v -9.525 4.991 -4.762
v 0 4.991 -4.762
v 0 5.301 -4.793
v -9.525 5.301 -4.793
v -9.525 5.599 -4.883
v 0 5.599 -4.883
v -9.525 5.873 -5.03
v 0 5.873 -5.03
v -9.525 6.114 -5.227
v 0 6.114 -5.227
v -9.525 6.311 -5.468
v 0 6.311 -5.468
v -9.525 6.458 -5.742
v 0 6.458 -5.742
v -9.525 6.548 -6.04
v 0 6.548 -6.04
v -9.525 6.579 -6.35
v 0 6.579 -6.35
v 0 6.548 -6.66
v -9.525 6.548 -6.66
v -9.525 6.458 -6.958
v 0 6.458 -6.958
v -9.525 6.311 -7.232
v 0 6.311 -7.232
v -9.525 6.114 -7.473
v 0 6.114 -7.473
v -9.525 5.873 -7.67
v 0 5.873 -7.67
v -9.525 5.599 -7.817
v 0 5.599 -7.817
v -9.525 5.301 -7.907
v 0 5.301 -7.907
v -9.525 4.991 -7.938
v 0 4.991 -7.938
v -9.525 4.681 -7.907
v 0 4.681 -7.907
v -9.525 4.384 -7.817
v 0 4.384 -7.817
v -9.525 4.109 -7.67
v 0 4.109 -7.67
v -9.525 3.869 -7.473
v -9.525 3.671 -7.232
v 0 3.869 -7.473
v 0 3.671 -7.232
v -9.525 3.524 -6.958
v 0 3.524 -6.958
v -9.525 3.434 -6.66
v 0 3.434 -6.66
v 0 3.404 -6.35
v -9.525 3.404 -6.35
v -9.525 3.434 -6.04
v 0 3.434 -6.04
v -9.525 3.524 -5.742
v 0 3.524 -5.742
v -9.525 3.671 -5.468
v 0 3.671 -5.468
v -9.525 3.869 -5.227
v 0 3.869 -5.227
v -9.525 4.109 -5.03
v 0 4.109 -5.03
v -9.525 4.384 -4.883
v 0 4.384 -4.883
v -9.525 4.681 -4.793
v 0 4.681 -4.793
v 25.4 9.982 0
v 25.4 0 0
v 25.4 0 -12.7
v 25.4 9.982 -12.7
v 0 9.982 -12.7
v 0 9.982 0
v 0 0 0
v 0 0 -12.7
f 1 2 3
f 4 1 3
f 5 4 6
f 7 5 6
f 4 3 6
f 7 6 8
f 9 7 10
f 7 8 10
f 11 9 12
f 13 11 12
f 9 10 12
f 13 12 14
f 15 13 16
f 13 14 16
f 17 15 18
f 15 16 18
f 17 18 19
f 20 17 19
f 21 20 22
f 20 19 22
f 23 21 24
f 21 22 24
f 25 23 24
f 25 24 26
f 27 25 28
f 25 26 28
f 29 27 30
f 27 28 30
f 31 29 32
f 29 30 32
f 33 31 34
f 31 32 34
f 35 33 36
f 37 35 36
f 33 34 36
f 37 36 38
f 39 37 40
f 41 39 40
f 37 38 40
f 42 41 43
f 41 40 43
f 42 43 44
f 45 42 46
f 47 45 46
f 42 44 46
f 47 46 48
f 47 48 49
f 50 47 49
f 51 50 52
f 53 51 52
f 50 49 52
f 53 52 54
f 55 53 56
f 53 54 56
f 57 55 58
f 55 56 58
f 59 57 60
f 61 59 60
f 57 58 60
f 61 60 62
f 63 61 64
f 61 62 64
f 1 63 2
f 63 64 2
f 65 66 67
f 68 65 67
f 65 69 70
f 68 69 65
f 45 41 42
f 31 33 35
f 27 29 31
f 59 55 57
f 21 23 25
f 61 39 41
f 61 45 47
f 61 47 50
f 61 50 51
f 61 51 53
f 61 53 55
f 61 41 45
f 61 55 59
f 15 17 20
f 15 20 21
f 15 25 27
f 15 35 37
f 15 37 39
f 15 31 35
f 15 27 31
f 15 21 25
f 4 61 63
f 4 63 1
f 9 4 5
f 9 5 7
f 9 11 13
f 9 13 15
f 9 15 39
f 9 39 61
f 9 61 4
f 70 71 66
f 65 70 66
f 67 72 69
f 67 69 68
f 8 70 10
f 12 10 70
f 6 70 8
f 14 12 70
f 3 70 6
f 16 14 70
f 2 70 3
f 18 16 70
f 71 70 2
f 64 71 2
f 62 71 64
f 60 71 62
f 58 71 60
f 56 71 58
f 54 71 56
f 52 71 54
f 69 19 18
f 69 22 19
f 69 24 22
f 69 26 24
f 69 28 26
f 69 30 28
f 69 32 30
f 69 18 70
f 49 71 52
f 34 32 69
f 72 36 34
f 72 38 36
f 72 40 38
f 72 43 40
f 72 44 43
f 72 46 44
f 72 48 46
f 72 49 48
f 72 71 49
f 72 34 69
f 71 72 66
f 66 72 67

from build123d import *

# Parameters (mm, degrees)
SKETCH1_W           = 25.4
SKETCH1_H           = 12.7
BOSS_EXTRUDE1_DEPTH = 9.9822
SKETCH3_R           = 1.5875
BOSS_EXTRUDE2_DEPTH = 9.525


with BuildPart() as part:
    # Sketch1 → Boss-Extrude1 (new body)
    with BuildSketch(Plane(origin=(0, 0, 0), x_dir=(1, 0, 0), z_dir=(0, 1, 0))):
        with Locations((12.7, 6.35)):
            Rectangle(SKETCH1_W, SKETCH1_H)
    extrude(amount=BOSS_EXTRUDE1_DEPTH)

    # Sketch3 → Boss-Extrude2 (add)
    with BuildSketch(Plane.ZY):
        with Locations((-6.35, 4.9911)):
            Circle(SKETCH3_R)
    extrude(amount=BOSS_EXTRUDE2_DEPTH)


solid = part.part
